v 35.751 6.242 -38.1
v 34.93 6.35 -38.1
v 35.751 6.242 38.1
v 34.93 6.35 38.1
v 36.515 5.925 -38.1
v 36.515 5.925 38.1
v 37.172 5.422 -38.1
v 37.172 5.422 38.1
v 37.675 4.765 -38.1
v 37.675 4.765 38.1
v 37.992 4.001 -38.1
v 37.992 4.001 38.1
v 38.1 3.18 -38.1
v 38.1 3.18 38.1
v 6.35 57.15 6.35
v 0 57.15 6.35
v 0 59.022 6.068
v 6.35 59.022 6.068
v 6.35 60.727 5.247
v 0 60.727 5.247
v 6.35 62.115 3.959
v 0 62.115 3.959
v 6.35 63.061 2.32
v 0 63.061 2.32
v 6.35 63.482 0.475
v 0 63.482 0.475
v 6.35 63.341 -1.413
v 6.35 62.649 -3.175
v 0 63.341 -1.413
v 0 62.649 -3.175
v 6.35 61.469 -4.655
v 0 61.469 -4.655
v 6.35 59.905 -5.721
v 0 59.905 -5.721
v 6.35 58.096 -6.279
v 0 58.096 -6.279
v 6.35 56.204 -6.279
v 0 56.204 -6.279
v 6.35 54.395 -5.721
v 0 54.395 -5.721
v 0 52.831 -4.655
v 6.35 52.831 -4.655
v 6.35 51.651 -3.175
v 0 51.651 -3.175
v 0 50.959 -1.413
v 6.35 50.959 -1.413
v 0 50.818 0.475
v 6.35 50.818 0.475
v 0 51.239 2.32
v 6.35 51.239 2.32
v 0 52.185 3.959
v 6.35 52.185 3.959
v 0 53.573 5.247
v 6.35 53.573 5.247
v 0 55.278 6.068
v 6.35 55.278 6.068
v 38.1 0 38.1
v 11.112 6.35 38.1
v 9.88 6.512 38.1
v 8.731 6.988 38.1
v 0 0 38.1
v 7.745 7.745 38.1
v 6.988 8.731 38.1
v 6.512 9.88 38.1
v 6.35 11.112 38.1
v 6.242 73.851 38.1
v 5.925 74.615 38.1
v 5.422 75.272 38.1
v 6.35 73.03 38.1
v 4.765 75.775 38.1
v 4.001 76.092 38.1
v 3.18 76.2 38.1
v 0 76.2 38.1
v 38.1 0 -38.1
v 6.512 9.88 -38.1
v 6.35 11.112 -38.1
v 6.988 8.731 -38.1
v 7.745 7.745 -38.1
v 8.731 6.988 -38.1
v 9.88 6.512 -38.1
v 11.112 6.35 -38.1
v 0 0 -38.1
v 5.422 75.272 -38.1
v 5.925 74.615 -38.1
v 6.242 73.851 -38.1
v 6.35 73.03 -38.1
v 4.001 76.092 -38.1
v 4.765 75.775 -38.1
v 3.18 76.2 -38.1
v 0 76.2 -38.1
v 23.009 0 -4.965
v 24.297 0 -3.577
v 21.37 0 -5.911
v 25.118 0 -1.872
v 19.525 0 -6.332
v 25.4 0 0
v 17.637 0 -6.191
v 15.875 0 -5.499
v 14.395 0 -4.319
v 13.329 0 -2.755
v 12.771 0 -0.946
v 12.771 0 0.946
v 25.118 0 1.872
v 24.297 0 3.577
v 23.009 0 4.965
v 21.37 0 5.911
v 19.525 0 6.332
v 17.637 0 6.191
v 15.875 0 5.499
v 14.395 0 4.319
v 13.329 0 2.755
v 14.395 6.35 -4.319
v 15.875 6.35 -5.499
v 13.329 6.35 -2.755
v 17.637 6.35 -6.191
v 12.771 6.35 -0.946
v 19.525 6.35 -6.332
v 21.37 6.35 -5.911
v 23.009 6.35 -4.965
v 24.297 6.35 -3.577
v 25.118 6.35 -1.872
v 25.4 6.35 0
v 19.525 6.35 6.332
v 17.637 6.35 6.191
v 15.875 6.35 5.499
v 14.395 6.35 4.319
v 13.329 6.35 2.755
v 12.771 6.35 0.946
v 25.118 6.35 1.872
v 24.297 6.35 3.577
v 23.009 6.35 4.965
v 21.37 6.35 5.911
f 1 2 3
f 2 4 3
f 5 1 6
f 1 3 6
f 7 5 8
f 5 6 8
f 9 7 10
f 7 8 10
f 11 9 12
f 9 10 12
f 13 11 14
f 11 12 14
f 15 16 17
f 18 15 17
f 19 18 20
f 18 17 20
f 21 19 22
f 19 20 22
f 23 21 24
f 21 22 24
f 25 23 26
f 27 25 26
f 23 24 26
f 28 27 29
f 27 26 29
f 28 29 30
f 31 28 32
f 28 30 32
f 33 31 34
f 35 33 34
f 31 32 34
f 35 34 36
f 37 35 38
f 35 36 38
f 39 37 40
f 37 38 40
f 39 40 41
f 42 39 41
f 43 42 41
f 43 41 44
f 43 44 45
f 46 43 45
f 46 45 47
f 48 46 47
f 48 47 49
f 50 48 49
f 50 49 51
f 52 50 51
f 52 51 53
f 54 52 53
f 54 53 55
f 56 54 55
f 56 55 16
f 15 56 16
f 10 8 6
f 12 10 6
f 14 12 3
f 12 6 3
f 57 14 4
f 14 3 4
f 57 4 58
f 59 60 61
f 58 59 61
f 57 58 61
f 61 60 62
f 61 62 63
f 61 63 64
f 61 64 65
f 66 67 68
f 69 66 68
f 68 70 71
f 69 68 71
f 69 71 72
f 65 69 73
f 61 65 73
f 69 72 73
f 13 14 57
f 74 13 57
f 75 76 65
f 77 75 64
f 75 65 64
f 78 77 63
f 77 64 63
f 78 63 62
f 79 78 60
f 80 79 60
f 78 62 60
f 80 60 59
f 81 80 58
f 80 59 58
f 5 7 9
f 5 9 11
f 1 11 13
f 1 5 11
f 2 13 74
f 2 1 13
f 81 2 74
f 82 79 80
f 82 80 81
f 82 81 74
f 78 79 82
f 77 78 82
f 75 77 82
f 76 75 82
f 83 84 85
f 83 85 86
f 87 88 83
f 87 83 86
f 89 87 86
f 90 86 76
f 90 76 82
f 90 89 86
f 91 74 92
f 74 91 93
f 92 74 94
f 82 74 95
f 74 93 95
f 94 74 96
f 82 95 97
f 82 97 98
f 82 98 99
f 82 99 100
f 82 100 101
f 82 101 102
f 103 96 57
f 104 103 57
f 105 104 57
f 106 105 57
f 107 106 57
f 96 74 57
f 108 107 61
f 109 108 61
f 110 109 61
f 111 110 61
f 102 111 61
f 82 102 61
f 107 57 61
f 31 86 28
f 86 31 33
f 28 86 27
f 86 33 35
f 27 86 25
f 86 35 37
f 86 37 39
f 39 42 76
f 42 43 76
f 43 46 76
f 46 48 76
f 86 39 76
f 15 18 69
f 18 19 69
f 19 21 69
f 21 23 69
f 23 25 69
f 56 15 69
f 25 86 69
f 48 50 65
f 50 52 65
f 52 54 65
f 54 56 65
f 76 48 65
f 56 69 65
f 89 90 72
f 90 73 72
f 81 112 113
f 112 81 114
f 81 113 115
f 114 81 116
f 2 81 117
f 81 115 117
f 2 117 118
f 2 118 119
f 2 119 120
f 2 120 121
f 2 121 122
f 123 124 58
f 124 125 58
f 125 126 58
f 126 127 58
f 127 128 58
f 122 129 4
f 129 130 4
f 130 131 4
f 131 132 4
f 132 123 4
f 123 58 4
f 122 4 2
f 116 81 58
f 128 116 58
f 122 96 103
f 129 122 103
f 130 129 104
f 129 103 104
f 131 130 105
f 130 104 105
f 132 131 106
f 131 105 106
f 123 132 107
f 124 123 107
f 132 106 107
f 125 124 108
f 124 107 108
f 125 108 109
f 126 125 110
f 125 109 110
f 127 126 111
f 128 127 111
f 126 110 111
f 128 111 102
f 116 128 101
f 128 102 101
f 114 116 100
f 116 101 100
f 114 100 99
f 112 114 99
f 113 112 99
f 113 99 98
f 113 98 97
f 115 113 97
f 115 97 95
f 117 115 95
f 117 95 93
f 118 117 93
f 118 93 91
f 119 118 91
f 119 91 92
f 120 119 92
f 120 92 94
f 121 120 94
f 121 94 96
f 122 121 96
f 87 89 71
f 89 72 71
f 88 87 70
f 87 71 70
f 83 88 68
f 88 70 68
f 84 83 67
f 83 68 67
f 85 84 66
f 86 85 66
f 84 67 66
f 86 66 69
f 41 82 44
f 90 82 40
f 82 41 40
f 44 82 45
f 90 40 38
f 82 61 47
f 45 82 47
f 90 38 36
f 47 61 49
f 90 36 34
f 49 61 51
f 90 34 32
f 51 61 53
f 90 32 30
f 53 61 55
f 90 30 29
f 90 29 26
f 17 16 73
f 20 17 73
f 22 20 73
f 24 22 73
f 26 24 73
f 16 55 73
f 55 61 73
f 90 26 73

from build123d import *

# Parameters (mm, degrees)
BASESTEELANGLE_DEPTH = 38.1
CUT_EXTRUDE1_REACH   = 78.2
SKETCH2_R            = 6.35
SKETCH3_R            = 6.35
CUT_EXTRUDE2_DEPTH   = 39.1


with BuildPart() as part:
    # Sketch1 → BaseSteelAngle (new body, symmetric)
    with BuildSketch(Plane.XY):
        with BuildLine():
            Line((0, 0), (0, 76.2))
            Line((0, 76.2), (3.18008, 76.2))
            ThreePointArc((3.18008, 76.2), (5.421551928, 75.271551928), (6.35, 73.03008))
            Line((6.35, 73.03008), (6.35, 11.1125))
            ThreePointArc((6.35, 11.1125), (7.744903955, 7.744903955), (11.1125, 6.35))
            Line((11.1125, 6.35), (34.93008, 6.35))
            ThreePointArc((34.93008, 6.35), (37.171551928, 5.421551928), (38.1, 3.18008))
            Line((38.1, 3.18008), (38.1, 0))
            Line((38.1, 0), (0, 0))
        make_face()
    extrude(amount=BASESTEELANGLE_DEPTH, both=True)

    # Sketch2 → Cut-Extrude1 (cut, up to next)
    with BuildSketch(Plane.XZ, mode=Mode.PRIVATE) as cut_extrude1_sk1:
        with Locations((19.05, 0)):
            Circle(SKETCH2_R)
    cut_extrude1_tool1 = extrude(cut_extrude1_sk1.sketch, amount=-CUT_EXTRUDE1_REACH, mode=Mode.PRIVATE) & part.part
    add(cut_extrude1_tool1.solids().sort_by_distance((19.05, 0, 0))[0], mode=Mode.SUBTRACT)

    # Sketch3 → Cut-Extrude2 (cut, through all)
    with BuildSketch(Plane.ZY):
        with Locations((0, 57.15)):
            Circle(SKETCH3_R)
    extrude(amount=-CUT_EXTRUDE2_DEPTH, mode=Mode.SUBTRACT)


solid = part.part
